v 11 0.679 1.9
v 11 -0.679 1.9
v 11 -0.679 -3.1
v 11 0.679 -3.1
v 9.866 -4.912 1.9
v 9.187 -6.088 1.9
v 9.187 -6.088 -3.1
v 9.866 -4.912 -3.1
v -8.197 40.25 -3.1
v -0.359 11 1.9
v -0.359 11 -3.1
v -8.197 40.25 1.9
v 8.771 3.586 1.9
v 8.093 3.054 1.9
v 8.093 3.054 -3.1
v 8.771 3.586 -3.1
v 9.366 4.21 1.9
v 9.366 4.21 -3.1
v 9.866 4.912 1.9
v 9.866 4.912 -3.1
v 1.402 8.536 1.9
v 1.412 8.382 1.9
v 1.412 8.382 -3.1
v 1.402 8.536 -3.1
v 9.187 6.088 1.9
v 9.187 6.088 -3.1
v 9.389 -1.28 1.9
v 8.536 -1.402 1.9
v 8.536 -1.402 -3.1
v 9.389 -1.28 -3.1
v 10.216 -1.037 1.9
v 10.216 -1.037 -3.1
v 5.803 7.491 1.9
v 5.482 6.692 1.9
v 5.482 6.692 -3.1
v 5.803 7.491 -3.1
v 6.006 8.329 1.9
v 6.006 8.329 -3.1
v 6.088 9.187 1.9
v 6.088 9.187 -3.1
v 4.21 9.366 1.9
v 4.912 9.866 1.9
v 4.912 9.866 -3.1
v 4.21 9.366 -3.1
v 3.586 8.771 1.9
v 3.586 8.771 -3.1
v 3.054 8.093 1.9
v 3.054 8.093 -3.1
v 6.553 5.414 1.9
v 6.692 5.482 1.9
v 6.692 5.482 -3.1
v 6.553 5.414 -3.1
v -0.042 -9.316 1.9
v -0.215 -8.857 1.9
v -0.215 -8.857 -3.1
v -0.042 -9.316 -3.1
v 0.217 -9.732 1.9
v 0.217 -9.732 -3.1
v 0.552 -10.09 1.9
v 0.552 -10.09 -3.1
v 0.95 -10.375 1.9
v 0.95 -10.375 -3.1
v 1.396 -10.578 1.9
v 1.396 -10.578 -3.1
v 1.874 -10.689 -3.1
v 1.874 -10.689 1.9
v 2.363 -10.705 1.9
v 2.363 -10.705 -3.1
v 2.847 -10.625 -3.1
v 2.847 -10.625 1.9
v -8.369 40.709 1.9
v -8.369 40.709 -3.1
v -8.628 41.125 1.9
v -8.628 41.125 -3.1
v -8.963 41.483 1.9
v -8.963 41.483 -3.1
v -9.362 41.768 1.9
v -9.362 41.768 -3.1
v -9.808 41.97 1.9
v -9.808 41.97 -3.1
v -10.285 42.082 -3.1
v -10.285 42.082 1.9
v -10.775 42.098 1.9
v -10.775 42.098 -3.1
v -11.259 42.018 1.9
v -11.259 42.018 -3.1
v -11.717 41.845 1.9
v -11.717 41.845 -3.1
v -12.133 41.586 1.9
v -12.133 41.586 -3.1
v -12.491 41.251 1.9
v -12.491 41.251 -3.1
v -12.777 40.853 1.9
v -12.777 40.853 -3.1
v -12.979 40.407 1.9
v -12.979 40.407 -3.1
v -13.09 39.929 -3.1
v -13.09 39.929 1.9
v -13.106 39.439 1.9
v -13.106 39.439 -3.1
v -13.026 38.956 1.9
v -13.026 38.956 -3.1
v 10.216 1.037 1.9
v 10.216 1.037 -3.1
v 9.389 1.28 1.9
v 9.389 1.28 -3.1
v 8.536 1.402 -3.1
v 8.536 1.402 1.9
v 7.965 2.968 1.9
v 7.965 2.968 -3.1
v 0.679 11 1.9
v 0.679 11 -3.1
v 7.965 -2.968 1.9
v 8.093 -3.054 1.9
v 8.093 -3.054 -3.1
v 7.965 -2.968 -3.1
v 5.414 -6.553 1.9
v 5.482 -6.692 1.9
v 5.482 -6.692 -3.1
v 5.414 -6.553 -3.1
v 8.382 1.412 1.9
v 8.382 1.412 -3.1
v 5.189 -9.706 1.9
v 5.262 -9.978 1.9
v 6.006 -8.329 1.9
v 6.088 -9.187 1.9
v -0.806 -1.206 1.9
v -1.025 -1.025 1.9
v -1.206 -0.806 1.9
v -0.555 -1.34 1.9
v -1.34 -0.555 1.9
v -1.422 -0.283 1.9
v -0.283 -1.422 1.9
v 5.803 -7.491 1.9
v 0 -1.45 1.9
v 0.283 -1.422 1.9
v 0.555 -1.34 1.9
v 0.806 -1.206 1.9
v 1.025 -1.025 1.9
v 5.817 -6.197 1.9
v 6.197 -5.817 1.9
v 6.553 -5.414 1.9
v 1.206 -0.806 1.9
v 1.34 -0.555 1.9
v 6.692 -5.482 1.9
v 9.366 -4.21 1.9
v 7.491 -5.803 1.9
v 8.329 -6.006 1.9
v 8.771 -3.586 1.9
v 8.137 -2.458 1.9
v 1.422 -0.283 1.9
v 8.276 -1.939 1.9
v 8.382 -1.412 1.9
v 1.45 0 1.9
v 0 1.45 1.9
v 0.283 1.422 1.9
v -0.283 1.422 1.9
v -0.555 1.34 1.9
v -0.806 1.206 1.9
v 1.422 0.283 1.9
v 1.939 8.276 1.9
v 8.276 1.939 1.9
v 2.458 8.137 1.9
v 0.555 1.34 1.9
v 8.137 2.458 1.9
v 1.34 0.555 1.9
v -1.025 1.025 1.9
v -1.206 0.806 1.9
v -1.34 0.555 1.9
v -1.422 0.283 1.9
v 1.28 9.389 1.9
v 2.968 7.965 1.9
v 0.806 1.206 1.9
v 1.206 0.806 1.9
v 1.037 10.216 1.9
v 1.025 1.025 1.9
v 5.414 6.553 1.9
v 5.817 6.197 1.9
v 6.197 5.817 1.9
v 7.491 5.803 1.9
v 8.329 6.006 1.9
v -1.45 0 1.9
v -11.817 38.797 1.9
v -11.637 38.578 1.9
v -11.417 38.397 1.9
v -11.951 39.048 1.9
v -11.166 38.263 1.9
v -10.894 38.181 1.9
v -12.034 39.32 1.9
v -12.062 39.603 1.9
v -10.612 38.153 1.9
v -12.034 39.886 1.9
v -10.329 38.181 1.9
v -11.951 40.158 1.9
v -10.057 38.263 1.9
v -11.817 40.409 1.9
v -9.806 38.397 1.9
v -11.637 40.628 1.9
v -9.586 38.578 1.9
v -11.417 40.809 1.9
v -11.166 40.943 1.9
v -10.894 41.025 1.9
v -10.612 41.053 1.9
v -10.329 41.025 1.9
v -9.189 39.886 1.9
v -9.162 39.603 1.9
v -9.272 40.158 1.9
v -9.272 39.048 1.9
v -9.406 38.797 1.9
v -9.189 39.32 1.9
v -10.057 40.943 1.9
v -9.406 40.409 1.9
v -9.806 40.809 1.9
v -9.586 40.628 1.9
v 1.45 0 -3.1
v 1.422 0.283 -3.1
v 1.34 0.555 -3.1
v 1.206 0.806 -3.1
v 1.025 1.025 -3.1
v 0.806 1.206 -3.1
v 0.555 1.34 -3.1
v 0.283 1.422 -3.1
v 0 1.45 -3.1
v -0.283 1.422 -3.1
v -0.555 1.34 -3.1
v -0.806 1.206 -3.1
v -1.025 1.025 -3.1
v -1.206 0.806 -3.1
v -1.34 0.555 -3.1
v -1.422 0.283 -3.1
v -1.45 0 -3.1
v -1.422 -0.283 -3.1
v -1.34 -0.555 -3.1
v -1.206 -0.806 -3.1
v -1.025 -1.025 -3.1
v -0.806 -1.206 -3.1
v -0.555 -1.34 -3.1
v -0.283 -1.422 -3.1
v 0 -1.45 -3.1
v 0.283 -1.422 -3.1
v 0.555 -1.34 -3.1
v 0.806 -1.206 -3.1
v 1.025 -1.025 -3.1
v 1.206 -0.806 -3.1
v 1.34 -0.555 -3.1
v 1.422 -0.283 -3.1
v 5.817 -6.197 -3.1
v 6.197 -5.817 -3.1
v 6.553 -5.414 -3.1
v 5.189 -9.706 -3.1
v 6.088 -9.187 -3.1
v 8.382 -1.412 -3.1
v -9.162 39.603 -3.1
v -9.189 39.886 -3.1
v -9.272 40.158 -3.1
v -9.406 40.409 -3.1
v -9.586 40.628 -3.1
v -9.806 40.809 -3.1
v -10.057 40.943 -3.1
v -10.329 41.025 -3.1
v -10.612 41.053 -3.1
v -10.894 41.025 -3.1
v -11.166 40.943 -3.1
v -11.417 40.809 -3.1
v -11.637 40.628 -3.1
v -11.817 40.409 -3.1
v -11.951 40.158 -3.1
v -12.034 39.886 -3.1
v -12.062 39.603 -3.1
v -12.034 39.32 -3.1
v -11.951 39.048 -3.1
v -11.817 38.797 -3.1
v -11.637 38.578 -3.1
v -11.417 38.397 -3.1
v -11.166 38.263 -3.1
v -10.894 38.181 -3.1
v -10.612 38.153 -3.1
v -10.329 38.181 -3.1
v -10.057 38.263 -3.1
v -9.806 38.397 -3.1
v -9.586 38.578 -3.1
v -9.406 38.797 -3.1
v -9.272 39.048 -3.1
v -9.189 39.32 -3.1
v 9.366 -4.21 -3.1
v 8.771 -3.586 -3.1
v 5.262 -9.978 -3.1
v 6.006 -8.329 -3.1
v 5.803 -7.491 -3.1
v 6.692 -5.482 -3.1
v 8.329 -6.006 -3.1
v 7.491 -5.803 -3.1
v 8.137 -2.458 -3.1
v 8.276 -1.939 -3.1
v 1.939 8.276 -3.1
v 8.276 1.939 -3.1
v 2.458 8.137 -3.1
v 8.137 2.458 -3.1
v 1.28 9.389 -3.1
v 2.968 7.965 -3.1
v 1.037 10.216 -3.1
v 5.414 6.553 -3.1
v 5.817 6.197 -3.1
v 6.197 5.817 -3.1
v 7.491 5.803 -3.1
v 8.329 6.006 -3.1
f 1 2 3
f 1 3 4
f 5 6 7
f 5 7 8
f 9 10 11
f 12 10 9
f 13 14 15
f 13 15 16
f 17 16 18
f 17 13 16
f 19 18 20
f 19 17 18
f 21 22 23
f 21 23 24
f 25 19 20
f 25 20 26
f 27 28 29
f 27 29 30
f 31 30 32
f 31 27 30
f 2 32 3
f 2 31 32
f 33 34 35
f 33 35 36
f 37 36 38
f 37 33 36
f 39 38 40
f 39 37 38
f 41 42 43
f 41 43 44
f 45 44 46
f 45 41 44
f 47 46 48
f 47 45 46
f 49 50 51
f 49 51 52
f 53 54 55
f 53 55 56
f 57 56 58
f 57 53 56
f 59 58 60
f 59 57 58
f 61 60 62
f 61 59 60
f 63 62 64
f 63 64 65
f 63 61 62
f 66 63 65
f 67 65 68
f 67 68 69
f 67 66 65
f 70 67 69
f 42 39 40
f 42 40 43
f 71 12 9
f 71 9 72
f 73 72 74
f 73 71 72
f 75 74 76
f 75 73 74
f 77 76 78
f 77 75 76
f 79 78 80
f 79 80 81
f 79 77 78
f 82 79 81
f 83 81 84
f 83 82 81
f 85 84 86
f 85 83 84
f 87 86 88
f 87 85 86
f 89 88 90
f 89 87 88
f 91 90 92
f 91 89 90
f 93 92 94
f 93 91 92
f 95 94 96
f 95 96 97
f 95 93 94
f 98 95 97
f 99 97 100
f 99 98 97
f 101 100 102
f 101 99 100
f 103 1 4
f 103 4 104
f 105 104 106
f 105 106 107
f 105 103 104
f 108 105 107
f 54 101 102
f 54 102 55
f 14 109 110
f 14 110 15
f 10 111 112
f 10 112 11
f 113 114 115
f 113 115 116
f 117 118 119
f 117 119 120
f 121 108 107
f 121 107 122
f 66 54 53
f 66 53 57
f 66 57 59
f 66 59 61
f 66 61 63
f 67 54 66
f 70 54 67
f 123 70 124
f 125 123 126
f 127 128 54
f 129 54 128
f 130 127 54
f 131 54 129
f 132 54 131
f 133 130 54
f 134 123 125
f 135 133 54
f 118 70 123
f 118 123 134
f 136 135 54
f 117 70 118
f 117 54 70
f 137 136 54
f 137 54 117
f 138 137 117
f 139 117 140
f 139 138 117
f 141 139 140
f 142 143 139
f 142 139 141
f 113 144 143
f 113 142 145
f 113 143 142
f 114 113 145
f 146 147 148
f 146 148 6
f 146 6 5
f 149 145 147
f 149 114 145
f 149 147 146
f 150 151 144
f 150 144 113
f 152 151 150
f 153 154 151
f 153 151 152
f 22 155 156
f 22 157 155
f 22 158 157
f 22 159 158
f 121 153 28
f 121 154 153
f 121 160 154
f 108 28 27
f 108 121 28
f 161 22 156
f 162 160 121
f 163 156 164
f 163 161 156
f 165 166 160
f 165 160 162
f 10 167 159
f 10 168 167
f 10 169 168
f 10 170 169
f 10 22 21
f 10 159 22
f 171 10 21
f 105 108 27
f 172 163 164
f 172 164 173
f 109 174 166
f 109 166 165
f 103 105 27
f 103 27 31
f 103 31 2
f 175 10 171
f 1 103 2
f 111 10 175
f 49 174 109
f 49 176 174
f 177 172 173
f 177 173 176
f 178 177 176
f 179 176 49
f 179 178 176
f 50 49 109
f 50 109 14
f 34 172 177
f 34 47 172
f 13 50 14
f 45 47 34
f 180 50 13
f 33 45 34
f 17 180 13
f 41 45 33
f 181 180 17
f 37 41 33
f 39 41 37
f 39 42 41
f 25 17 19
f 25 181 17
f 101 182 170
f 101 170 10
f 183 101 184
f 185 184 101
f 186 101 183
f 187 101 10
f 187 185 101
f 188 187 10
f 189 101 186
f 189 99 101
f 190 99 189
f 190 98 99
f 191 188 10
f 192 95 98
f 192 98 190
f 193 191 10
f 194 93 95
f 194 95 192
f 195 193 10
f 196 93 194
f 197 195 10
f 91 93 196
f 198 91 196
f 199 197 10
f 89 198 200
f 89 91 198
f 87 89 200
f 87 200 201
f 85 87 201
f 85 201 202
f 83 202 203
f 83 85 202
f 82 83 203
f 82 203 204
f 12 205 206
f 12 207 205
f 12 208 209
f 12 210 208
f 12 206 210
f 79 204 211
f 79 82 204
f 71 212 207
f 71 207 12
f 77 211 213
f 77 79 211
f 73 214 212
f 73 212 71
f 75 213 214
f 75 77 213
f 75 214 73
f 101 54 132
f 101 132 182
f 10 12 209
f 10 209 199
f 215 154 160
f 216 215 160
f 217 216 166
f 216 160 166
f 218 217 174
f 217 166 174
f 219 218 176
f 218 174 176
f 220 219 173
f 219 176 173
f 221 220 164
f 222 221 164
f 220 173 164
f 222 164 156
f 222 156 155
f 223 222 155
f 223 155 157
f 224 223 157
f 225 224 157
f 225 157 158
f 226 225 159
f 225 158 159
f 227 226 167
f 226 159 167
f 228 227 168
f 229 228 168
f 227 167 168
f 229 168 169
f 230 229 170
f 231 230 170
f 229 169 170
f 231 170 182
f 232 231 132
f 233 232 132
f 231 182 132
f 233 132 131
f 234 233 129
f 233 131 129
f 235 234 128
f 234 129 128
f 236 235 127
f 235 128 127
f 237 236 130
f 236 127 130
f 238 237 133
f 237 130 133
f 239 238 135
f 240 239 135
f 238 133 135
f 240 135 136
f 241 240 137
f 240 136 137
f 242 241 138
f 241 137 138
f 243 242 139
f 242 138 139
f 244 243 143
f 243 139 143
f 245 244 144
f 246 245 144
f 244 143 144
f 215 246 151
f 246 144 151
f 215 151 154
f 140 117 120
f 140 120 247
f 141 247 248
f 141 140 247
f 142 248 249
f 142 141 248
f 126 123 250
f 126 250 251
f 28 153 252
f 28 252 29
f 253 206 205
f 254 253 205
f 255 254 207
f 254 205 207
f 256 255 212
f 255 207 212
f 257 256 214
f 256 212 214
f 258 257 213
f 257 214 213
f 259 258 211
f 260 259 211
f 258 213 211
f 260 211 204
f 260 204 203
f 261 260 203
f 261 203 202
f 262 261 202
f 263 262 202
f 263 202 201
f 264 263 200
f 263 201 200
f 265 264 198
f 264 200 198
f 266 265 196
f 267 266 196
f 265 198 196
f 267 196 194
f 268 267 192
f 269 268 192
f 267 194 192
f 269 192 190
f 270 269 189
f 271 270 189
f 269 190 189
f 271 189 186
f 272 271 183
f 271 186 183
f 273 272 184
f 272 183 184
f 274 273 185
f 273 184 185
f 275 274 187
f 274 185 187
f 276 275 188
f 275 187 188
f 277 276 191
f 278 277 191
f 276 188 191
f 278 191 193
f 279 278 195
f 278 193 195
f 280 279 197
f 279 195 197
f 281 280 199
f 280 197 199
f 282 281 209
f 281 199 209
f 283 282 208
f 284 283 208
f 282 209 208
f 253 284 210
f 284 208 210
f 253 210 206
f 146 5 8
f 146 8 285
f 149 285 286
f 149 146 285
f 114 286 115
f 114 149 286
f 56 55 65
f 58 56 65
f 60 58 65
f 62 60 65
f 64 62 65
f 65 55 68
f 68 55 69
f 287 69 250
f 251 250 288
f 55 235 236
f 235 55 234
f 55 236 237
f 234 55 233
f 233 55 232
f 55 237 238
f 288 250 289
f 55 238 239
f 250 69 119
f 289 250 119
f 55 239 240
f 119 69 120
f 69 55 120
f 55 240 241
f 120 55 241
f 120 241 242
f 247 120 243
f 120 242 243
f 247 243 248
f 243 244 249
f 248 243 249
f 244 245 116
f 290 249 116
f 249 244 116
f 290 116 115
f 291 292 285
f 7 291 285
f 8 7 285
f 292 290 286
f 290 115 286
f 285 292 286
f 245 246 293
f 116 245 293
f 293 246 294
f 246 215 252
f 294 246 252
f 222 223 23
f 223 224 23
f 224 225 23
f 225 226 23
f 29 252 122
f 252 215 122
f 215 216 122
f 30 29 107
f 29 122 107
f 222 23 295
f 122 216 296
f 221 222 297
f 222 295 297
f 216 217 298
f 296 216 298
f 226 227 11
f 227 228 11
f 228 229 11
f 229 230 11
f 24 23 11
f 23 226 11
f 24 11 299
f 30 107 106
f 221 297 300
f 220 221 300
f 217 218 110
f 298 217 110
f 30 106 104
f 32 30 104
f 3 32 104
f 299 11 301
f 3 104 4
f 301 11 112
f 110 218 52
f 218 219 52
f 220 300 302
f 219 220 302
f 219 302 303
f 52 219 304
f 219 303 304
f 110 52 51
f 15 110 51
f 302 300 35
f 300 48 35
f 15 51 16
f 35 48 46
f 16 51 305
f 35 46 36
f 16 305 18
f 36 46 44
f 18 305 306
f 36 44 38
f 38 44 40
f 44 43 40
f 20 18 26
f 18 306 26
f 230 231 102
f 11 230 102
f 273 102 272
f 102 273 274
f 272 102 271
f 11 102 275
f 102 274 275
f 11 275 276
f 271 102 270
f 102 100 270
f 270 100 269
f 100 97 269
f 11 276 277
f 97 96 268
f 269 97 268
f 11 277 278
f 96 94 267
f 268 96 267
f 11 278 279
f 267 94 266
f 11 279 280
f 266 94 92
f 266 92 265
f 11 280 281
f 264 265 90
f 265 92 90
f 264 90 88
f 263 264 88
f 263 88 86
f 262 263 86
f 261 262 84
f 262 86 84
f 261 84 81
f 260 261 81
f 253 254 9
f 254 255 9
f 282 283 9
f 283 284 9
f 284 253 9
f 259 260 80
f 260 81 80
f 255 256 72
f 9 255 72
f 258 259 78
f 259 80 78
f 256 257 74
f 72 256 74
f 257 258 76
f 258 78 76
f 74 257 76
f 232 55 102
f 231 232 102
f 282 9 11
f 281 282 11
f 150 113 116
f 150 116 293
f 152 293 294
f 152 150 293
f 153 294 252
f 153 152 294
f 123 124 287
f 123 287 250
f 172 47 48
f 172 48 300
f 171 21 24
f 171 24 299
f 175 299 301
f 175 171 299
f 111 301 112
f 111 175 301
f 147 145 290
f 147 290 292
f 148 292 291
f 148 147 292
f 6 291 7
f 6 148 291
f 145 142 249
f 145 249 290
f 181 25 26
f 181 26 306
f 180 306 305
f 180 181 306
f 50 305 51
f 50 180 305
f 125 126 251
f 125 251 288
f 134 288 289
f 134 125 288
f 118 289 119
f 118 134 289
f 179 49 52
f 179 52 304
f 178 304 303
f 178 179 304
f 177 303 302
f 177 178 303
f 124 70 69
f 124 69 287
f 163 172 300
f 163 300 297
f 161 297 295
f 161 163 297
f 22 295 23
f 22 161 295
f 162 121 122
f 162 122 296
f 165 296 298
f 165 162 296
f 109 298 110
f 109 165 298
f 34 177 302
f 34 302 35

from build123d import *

# Parameters (mm, degrees)
SKETCH1_R           = 1.45
BOSS_EXTRUDE1_DEPTH = 5


with BuildPart() as part:
    # Sketch1 → Boss-Extrude1 (new body)
    with BuildSketch(Plane.XY.offset(1.9)):
        with BuildLine():
            Line((-13.026395415, 38.955911265), (-0.214852682, -8.857417136))
            ThreePointArc((-0.214852682, -8.857417136), (0.949961883, -10.375433033), (2.847009496, -10.625184089))
            Line((2.847009496, -10.625184089), (5.261824062, -9.978136476))
            Line((5.261824062, -9.978136476), (5.188879797, -9.705904774))
            Line((5.188879797, -9.705904774), (6.08761429, -9.187020173))
            ThreePointArc((6.08761429, -9.187020173), (5.919814799, -7.906537121), (5.481893659, -6.691622066))
            Line((5.481893659, -6.691622066), (5.414116812, -6.552658937))
            ThreePointArc((5.414116812, -6.552658937), (6.01040764, -6.01040764), (6.552658937, -5.414116812))
            Line((6.552658937, -5.414116812), (6.691622066, -5.481893659))
            ThreePointArc((6.691622066, -5.481893659), (7.906537121, -5.919814799), (9.187020173, -6.08761429))
            Line((9.187020173, -6.08761429), (9.86553871, -4.91238571))
            ThreePointArc((9.86553871, -4.91238571), (9.079978562, -3.887354604), (8.093270203, -3.054167872))
            Line((8.093270203, -3.054167872), (7.965092167, -2.967710696))
            ThreePointArc((7.965092167, -2.967710696), (8.210369523, -2.199961883), (8.381827508, -1.41243323))
            Line((8.381827508, -1.41243323), (8.536061531, -1.401648137))
            ThreePointArc((8.536061531, -1.401648137), (9.807169402, -1.173441441), (11, -0.678518537))
            Line((11, -0.678518537), (11, 0.678518537))
            ThreePointArc((11, 0.678518537), (9.807169402, 1.173441441), (8.536061531, 1.401648137))
            Line((8.536061531, 1.401648137), (8.381827508, 1.41243323))
            ThreePointArc((8.381827508, 1.41243323), (8.210369523, 2.199961883), (7.965092167, 2.967710696))
            Line((7.965092167, 2.967710696), (8.093270203, 3.054167872))
            ThreePointArc((8.093270203, 3.054167872), (9.079978562, 3.887354604), (9.86553871, 4.91238571))
            Line((9.86553871, 4.91238571), (9.187020173, 6.08761429))
            ThreePointArc((9.187020173, 6.08761429), (7.906537121, 5.919814799), (6.691622066, 5.481893659))
            Line((6.691622066, 5.481893659), (6.552658937, 5.414116812))
            ThreePointArc((6.552658937, 5.414116812), (6.01040764, 6.01040764), (5.414116812, 6.552658937))
            Line((5.414116812, 6.552658937), (5.481893659, 6.691622066))
            ThreePointArc((5.481893659, 6.691622066), (5.919814799, 7.906537121), (6.08761429, 9.187020173))
            Line((6.08761429, 9.187020173), (4.91238571, 9.86553871))
            ThreePointArc((4.91238571, 9.86553871), (3.887354604, 9.079978562), (3.054167872, 8.093270203))
            Line((3.054167872, 8.093270203), (2.967710696, 7.965092167))
            ThreePointArc((2.967710696, 7.965092167), (2.199961883, 8.210369523), (1.41243323, 8.381827508))
            Line((1.41243323, 8.381827508), (1.401648136, 8.536061531))
            ThreePointArc((1.401648136, 8.536061531), (1.173441441, 9.807169402), (0.678518537, 11))
            Line((0.678518537, 11), (-0.359250666, 11))
            Line((-0.359250666, 11), (-8.196766283, 40.250006491))
            ThreePointArc((-8.196766283, 40.250006491), (-11.258628462, 42.017773444), (-13.026395415, 38.955911265))
        make_face()
        with Locations((-10.611580849, 39.602958878)):
            Circle(SKETCH1_R, mode=Mode.SUBTRACT)
        Circle(SKETCH1_R, mode=Mode.SUBTRACT)
    extrude(amount=-BOSS_EXTRUDE1_DEPTH)


solid = part.part
